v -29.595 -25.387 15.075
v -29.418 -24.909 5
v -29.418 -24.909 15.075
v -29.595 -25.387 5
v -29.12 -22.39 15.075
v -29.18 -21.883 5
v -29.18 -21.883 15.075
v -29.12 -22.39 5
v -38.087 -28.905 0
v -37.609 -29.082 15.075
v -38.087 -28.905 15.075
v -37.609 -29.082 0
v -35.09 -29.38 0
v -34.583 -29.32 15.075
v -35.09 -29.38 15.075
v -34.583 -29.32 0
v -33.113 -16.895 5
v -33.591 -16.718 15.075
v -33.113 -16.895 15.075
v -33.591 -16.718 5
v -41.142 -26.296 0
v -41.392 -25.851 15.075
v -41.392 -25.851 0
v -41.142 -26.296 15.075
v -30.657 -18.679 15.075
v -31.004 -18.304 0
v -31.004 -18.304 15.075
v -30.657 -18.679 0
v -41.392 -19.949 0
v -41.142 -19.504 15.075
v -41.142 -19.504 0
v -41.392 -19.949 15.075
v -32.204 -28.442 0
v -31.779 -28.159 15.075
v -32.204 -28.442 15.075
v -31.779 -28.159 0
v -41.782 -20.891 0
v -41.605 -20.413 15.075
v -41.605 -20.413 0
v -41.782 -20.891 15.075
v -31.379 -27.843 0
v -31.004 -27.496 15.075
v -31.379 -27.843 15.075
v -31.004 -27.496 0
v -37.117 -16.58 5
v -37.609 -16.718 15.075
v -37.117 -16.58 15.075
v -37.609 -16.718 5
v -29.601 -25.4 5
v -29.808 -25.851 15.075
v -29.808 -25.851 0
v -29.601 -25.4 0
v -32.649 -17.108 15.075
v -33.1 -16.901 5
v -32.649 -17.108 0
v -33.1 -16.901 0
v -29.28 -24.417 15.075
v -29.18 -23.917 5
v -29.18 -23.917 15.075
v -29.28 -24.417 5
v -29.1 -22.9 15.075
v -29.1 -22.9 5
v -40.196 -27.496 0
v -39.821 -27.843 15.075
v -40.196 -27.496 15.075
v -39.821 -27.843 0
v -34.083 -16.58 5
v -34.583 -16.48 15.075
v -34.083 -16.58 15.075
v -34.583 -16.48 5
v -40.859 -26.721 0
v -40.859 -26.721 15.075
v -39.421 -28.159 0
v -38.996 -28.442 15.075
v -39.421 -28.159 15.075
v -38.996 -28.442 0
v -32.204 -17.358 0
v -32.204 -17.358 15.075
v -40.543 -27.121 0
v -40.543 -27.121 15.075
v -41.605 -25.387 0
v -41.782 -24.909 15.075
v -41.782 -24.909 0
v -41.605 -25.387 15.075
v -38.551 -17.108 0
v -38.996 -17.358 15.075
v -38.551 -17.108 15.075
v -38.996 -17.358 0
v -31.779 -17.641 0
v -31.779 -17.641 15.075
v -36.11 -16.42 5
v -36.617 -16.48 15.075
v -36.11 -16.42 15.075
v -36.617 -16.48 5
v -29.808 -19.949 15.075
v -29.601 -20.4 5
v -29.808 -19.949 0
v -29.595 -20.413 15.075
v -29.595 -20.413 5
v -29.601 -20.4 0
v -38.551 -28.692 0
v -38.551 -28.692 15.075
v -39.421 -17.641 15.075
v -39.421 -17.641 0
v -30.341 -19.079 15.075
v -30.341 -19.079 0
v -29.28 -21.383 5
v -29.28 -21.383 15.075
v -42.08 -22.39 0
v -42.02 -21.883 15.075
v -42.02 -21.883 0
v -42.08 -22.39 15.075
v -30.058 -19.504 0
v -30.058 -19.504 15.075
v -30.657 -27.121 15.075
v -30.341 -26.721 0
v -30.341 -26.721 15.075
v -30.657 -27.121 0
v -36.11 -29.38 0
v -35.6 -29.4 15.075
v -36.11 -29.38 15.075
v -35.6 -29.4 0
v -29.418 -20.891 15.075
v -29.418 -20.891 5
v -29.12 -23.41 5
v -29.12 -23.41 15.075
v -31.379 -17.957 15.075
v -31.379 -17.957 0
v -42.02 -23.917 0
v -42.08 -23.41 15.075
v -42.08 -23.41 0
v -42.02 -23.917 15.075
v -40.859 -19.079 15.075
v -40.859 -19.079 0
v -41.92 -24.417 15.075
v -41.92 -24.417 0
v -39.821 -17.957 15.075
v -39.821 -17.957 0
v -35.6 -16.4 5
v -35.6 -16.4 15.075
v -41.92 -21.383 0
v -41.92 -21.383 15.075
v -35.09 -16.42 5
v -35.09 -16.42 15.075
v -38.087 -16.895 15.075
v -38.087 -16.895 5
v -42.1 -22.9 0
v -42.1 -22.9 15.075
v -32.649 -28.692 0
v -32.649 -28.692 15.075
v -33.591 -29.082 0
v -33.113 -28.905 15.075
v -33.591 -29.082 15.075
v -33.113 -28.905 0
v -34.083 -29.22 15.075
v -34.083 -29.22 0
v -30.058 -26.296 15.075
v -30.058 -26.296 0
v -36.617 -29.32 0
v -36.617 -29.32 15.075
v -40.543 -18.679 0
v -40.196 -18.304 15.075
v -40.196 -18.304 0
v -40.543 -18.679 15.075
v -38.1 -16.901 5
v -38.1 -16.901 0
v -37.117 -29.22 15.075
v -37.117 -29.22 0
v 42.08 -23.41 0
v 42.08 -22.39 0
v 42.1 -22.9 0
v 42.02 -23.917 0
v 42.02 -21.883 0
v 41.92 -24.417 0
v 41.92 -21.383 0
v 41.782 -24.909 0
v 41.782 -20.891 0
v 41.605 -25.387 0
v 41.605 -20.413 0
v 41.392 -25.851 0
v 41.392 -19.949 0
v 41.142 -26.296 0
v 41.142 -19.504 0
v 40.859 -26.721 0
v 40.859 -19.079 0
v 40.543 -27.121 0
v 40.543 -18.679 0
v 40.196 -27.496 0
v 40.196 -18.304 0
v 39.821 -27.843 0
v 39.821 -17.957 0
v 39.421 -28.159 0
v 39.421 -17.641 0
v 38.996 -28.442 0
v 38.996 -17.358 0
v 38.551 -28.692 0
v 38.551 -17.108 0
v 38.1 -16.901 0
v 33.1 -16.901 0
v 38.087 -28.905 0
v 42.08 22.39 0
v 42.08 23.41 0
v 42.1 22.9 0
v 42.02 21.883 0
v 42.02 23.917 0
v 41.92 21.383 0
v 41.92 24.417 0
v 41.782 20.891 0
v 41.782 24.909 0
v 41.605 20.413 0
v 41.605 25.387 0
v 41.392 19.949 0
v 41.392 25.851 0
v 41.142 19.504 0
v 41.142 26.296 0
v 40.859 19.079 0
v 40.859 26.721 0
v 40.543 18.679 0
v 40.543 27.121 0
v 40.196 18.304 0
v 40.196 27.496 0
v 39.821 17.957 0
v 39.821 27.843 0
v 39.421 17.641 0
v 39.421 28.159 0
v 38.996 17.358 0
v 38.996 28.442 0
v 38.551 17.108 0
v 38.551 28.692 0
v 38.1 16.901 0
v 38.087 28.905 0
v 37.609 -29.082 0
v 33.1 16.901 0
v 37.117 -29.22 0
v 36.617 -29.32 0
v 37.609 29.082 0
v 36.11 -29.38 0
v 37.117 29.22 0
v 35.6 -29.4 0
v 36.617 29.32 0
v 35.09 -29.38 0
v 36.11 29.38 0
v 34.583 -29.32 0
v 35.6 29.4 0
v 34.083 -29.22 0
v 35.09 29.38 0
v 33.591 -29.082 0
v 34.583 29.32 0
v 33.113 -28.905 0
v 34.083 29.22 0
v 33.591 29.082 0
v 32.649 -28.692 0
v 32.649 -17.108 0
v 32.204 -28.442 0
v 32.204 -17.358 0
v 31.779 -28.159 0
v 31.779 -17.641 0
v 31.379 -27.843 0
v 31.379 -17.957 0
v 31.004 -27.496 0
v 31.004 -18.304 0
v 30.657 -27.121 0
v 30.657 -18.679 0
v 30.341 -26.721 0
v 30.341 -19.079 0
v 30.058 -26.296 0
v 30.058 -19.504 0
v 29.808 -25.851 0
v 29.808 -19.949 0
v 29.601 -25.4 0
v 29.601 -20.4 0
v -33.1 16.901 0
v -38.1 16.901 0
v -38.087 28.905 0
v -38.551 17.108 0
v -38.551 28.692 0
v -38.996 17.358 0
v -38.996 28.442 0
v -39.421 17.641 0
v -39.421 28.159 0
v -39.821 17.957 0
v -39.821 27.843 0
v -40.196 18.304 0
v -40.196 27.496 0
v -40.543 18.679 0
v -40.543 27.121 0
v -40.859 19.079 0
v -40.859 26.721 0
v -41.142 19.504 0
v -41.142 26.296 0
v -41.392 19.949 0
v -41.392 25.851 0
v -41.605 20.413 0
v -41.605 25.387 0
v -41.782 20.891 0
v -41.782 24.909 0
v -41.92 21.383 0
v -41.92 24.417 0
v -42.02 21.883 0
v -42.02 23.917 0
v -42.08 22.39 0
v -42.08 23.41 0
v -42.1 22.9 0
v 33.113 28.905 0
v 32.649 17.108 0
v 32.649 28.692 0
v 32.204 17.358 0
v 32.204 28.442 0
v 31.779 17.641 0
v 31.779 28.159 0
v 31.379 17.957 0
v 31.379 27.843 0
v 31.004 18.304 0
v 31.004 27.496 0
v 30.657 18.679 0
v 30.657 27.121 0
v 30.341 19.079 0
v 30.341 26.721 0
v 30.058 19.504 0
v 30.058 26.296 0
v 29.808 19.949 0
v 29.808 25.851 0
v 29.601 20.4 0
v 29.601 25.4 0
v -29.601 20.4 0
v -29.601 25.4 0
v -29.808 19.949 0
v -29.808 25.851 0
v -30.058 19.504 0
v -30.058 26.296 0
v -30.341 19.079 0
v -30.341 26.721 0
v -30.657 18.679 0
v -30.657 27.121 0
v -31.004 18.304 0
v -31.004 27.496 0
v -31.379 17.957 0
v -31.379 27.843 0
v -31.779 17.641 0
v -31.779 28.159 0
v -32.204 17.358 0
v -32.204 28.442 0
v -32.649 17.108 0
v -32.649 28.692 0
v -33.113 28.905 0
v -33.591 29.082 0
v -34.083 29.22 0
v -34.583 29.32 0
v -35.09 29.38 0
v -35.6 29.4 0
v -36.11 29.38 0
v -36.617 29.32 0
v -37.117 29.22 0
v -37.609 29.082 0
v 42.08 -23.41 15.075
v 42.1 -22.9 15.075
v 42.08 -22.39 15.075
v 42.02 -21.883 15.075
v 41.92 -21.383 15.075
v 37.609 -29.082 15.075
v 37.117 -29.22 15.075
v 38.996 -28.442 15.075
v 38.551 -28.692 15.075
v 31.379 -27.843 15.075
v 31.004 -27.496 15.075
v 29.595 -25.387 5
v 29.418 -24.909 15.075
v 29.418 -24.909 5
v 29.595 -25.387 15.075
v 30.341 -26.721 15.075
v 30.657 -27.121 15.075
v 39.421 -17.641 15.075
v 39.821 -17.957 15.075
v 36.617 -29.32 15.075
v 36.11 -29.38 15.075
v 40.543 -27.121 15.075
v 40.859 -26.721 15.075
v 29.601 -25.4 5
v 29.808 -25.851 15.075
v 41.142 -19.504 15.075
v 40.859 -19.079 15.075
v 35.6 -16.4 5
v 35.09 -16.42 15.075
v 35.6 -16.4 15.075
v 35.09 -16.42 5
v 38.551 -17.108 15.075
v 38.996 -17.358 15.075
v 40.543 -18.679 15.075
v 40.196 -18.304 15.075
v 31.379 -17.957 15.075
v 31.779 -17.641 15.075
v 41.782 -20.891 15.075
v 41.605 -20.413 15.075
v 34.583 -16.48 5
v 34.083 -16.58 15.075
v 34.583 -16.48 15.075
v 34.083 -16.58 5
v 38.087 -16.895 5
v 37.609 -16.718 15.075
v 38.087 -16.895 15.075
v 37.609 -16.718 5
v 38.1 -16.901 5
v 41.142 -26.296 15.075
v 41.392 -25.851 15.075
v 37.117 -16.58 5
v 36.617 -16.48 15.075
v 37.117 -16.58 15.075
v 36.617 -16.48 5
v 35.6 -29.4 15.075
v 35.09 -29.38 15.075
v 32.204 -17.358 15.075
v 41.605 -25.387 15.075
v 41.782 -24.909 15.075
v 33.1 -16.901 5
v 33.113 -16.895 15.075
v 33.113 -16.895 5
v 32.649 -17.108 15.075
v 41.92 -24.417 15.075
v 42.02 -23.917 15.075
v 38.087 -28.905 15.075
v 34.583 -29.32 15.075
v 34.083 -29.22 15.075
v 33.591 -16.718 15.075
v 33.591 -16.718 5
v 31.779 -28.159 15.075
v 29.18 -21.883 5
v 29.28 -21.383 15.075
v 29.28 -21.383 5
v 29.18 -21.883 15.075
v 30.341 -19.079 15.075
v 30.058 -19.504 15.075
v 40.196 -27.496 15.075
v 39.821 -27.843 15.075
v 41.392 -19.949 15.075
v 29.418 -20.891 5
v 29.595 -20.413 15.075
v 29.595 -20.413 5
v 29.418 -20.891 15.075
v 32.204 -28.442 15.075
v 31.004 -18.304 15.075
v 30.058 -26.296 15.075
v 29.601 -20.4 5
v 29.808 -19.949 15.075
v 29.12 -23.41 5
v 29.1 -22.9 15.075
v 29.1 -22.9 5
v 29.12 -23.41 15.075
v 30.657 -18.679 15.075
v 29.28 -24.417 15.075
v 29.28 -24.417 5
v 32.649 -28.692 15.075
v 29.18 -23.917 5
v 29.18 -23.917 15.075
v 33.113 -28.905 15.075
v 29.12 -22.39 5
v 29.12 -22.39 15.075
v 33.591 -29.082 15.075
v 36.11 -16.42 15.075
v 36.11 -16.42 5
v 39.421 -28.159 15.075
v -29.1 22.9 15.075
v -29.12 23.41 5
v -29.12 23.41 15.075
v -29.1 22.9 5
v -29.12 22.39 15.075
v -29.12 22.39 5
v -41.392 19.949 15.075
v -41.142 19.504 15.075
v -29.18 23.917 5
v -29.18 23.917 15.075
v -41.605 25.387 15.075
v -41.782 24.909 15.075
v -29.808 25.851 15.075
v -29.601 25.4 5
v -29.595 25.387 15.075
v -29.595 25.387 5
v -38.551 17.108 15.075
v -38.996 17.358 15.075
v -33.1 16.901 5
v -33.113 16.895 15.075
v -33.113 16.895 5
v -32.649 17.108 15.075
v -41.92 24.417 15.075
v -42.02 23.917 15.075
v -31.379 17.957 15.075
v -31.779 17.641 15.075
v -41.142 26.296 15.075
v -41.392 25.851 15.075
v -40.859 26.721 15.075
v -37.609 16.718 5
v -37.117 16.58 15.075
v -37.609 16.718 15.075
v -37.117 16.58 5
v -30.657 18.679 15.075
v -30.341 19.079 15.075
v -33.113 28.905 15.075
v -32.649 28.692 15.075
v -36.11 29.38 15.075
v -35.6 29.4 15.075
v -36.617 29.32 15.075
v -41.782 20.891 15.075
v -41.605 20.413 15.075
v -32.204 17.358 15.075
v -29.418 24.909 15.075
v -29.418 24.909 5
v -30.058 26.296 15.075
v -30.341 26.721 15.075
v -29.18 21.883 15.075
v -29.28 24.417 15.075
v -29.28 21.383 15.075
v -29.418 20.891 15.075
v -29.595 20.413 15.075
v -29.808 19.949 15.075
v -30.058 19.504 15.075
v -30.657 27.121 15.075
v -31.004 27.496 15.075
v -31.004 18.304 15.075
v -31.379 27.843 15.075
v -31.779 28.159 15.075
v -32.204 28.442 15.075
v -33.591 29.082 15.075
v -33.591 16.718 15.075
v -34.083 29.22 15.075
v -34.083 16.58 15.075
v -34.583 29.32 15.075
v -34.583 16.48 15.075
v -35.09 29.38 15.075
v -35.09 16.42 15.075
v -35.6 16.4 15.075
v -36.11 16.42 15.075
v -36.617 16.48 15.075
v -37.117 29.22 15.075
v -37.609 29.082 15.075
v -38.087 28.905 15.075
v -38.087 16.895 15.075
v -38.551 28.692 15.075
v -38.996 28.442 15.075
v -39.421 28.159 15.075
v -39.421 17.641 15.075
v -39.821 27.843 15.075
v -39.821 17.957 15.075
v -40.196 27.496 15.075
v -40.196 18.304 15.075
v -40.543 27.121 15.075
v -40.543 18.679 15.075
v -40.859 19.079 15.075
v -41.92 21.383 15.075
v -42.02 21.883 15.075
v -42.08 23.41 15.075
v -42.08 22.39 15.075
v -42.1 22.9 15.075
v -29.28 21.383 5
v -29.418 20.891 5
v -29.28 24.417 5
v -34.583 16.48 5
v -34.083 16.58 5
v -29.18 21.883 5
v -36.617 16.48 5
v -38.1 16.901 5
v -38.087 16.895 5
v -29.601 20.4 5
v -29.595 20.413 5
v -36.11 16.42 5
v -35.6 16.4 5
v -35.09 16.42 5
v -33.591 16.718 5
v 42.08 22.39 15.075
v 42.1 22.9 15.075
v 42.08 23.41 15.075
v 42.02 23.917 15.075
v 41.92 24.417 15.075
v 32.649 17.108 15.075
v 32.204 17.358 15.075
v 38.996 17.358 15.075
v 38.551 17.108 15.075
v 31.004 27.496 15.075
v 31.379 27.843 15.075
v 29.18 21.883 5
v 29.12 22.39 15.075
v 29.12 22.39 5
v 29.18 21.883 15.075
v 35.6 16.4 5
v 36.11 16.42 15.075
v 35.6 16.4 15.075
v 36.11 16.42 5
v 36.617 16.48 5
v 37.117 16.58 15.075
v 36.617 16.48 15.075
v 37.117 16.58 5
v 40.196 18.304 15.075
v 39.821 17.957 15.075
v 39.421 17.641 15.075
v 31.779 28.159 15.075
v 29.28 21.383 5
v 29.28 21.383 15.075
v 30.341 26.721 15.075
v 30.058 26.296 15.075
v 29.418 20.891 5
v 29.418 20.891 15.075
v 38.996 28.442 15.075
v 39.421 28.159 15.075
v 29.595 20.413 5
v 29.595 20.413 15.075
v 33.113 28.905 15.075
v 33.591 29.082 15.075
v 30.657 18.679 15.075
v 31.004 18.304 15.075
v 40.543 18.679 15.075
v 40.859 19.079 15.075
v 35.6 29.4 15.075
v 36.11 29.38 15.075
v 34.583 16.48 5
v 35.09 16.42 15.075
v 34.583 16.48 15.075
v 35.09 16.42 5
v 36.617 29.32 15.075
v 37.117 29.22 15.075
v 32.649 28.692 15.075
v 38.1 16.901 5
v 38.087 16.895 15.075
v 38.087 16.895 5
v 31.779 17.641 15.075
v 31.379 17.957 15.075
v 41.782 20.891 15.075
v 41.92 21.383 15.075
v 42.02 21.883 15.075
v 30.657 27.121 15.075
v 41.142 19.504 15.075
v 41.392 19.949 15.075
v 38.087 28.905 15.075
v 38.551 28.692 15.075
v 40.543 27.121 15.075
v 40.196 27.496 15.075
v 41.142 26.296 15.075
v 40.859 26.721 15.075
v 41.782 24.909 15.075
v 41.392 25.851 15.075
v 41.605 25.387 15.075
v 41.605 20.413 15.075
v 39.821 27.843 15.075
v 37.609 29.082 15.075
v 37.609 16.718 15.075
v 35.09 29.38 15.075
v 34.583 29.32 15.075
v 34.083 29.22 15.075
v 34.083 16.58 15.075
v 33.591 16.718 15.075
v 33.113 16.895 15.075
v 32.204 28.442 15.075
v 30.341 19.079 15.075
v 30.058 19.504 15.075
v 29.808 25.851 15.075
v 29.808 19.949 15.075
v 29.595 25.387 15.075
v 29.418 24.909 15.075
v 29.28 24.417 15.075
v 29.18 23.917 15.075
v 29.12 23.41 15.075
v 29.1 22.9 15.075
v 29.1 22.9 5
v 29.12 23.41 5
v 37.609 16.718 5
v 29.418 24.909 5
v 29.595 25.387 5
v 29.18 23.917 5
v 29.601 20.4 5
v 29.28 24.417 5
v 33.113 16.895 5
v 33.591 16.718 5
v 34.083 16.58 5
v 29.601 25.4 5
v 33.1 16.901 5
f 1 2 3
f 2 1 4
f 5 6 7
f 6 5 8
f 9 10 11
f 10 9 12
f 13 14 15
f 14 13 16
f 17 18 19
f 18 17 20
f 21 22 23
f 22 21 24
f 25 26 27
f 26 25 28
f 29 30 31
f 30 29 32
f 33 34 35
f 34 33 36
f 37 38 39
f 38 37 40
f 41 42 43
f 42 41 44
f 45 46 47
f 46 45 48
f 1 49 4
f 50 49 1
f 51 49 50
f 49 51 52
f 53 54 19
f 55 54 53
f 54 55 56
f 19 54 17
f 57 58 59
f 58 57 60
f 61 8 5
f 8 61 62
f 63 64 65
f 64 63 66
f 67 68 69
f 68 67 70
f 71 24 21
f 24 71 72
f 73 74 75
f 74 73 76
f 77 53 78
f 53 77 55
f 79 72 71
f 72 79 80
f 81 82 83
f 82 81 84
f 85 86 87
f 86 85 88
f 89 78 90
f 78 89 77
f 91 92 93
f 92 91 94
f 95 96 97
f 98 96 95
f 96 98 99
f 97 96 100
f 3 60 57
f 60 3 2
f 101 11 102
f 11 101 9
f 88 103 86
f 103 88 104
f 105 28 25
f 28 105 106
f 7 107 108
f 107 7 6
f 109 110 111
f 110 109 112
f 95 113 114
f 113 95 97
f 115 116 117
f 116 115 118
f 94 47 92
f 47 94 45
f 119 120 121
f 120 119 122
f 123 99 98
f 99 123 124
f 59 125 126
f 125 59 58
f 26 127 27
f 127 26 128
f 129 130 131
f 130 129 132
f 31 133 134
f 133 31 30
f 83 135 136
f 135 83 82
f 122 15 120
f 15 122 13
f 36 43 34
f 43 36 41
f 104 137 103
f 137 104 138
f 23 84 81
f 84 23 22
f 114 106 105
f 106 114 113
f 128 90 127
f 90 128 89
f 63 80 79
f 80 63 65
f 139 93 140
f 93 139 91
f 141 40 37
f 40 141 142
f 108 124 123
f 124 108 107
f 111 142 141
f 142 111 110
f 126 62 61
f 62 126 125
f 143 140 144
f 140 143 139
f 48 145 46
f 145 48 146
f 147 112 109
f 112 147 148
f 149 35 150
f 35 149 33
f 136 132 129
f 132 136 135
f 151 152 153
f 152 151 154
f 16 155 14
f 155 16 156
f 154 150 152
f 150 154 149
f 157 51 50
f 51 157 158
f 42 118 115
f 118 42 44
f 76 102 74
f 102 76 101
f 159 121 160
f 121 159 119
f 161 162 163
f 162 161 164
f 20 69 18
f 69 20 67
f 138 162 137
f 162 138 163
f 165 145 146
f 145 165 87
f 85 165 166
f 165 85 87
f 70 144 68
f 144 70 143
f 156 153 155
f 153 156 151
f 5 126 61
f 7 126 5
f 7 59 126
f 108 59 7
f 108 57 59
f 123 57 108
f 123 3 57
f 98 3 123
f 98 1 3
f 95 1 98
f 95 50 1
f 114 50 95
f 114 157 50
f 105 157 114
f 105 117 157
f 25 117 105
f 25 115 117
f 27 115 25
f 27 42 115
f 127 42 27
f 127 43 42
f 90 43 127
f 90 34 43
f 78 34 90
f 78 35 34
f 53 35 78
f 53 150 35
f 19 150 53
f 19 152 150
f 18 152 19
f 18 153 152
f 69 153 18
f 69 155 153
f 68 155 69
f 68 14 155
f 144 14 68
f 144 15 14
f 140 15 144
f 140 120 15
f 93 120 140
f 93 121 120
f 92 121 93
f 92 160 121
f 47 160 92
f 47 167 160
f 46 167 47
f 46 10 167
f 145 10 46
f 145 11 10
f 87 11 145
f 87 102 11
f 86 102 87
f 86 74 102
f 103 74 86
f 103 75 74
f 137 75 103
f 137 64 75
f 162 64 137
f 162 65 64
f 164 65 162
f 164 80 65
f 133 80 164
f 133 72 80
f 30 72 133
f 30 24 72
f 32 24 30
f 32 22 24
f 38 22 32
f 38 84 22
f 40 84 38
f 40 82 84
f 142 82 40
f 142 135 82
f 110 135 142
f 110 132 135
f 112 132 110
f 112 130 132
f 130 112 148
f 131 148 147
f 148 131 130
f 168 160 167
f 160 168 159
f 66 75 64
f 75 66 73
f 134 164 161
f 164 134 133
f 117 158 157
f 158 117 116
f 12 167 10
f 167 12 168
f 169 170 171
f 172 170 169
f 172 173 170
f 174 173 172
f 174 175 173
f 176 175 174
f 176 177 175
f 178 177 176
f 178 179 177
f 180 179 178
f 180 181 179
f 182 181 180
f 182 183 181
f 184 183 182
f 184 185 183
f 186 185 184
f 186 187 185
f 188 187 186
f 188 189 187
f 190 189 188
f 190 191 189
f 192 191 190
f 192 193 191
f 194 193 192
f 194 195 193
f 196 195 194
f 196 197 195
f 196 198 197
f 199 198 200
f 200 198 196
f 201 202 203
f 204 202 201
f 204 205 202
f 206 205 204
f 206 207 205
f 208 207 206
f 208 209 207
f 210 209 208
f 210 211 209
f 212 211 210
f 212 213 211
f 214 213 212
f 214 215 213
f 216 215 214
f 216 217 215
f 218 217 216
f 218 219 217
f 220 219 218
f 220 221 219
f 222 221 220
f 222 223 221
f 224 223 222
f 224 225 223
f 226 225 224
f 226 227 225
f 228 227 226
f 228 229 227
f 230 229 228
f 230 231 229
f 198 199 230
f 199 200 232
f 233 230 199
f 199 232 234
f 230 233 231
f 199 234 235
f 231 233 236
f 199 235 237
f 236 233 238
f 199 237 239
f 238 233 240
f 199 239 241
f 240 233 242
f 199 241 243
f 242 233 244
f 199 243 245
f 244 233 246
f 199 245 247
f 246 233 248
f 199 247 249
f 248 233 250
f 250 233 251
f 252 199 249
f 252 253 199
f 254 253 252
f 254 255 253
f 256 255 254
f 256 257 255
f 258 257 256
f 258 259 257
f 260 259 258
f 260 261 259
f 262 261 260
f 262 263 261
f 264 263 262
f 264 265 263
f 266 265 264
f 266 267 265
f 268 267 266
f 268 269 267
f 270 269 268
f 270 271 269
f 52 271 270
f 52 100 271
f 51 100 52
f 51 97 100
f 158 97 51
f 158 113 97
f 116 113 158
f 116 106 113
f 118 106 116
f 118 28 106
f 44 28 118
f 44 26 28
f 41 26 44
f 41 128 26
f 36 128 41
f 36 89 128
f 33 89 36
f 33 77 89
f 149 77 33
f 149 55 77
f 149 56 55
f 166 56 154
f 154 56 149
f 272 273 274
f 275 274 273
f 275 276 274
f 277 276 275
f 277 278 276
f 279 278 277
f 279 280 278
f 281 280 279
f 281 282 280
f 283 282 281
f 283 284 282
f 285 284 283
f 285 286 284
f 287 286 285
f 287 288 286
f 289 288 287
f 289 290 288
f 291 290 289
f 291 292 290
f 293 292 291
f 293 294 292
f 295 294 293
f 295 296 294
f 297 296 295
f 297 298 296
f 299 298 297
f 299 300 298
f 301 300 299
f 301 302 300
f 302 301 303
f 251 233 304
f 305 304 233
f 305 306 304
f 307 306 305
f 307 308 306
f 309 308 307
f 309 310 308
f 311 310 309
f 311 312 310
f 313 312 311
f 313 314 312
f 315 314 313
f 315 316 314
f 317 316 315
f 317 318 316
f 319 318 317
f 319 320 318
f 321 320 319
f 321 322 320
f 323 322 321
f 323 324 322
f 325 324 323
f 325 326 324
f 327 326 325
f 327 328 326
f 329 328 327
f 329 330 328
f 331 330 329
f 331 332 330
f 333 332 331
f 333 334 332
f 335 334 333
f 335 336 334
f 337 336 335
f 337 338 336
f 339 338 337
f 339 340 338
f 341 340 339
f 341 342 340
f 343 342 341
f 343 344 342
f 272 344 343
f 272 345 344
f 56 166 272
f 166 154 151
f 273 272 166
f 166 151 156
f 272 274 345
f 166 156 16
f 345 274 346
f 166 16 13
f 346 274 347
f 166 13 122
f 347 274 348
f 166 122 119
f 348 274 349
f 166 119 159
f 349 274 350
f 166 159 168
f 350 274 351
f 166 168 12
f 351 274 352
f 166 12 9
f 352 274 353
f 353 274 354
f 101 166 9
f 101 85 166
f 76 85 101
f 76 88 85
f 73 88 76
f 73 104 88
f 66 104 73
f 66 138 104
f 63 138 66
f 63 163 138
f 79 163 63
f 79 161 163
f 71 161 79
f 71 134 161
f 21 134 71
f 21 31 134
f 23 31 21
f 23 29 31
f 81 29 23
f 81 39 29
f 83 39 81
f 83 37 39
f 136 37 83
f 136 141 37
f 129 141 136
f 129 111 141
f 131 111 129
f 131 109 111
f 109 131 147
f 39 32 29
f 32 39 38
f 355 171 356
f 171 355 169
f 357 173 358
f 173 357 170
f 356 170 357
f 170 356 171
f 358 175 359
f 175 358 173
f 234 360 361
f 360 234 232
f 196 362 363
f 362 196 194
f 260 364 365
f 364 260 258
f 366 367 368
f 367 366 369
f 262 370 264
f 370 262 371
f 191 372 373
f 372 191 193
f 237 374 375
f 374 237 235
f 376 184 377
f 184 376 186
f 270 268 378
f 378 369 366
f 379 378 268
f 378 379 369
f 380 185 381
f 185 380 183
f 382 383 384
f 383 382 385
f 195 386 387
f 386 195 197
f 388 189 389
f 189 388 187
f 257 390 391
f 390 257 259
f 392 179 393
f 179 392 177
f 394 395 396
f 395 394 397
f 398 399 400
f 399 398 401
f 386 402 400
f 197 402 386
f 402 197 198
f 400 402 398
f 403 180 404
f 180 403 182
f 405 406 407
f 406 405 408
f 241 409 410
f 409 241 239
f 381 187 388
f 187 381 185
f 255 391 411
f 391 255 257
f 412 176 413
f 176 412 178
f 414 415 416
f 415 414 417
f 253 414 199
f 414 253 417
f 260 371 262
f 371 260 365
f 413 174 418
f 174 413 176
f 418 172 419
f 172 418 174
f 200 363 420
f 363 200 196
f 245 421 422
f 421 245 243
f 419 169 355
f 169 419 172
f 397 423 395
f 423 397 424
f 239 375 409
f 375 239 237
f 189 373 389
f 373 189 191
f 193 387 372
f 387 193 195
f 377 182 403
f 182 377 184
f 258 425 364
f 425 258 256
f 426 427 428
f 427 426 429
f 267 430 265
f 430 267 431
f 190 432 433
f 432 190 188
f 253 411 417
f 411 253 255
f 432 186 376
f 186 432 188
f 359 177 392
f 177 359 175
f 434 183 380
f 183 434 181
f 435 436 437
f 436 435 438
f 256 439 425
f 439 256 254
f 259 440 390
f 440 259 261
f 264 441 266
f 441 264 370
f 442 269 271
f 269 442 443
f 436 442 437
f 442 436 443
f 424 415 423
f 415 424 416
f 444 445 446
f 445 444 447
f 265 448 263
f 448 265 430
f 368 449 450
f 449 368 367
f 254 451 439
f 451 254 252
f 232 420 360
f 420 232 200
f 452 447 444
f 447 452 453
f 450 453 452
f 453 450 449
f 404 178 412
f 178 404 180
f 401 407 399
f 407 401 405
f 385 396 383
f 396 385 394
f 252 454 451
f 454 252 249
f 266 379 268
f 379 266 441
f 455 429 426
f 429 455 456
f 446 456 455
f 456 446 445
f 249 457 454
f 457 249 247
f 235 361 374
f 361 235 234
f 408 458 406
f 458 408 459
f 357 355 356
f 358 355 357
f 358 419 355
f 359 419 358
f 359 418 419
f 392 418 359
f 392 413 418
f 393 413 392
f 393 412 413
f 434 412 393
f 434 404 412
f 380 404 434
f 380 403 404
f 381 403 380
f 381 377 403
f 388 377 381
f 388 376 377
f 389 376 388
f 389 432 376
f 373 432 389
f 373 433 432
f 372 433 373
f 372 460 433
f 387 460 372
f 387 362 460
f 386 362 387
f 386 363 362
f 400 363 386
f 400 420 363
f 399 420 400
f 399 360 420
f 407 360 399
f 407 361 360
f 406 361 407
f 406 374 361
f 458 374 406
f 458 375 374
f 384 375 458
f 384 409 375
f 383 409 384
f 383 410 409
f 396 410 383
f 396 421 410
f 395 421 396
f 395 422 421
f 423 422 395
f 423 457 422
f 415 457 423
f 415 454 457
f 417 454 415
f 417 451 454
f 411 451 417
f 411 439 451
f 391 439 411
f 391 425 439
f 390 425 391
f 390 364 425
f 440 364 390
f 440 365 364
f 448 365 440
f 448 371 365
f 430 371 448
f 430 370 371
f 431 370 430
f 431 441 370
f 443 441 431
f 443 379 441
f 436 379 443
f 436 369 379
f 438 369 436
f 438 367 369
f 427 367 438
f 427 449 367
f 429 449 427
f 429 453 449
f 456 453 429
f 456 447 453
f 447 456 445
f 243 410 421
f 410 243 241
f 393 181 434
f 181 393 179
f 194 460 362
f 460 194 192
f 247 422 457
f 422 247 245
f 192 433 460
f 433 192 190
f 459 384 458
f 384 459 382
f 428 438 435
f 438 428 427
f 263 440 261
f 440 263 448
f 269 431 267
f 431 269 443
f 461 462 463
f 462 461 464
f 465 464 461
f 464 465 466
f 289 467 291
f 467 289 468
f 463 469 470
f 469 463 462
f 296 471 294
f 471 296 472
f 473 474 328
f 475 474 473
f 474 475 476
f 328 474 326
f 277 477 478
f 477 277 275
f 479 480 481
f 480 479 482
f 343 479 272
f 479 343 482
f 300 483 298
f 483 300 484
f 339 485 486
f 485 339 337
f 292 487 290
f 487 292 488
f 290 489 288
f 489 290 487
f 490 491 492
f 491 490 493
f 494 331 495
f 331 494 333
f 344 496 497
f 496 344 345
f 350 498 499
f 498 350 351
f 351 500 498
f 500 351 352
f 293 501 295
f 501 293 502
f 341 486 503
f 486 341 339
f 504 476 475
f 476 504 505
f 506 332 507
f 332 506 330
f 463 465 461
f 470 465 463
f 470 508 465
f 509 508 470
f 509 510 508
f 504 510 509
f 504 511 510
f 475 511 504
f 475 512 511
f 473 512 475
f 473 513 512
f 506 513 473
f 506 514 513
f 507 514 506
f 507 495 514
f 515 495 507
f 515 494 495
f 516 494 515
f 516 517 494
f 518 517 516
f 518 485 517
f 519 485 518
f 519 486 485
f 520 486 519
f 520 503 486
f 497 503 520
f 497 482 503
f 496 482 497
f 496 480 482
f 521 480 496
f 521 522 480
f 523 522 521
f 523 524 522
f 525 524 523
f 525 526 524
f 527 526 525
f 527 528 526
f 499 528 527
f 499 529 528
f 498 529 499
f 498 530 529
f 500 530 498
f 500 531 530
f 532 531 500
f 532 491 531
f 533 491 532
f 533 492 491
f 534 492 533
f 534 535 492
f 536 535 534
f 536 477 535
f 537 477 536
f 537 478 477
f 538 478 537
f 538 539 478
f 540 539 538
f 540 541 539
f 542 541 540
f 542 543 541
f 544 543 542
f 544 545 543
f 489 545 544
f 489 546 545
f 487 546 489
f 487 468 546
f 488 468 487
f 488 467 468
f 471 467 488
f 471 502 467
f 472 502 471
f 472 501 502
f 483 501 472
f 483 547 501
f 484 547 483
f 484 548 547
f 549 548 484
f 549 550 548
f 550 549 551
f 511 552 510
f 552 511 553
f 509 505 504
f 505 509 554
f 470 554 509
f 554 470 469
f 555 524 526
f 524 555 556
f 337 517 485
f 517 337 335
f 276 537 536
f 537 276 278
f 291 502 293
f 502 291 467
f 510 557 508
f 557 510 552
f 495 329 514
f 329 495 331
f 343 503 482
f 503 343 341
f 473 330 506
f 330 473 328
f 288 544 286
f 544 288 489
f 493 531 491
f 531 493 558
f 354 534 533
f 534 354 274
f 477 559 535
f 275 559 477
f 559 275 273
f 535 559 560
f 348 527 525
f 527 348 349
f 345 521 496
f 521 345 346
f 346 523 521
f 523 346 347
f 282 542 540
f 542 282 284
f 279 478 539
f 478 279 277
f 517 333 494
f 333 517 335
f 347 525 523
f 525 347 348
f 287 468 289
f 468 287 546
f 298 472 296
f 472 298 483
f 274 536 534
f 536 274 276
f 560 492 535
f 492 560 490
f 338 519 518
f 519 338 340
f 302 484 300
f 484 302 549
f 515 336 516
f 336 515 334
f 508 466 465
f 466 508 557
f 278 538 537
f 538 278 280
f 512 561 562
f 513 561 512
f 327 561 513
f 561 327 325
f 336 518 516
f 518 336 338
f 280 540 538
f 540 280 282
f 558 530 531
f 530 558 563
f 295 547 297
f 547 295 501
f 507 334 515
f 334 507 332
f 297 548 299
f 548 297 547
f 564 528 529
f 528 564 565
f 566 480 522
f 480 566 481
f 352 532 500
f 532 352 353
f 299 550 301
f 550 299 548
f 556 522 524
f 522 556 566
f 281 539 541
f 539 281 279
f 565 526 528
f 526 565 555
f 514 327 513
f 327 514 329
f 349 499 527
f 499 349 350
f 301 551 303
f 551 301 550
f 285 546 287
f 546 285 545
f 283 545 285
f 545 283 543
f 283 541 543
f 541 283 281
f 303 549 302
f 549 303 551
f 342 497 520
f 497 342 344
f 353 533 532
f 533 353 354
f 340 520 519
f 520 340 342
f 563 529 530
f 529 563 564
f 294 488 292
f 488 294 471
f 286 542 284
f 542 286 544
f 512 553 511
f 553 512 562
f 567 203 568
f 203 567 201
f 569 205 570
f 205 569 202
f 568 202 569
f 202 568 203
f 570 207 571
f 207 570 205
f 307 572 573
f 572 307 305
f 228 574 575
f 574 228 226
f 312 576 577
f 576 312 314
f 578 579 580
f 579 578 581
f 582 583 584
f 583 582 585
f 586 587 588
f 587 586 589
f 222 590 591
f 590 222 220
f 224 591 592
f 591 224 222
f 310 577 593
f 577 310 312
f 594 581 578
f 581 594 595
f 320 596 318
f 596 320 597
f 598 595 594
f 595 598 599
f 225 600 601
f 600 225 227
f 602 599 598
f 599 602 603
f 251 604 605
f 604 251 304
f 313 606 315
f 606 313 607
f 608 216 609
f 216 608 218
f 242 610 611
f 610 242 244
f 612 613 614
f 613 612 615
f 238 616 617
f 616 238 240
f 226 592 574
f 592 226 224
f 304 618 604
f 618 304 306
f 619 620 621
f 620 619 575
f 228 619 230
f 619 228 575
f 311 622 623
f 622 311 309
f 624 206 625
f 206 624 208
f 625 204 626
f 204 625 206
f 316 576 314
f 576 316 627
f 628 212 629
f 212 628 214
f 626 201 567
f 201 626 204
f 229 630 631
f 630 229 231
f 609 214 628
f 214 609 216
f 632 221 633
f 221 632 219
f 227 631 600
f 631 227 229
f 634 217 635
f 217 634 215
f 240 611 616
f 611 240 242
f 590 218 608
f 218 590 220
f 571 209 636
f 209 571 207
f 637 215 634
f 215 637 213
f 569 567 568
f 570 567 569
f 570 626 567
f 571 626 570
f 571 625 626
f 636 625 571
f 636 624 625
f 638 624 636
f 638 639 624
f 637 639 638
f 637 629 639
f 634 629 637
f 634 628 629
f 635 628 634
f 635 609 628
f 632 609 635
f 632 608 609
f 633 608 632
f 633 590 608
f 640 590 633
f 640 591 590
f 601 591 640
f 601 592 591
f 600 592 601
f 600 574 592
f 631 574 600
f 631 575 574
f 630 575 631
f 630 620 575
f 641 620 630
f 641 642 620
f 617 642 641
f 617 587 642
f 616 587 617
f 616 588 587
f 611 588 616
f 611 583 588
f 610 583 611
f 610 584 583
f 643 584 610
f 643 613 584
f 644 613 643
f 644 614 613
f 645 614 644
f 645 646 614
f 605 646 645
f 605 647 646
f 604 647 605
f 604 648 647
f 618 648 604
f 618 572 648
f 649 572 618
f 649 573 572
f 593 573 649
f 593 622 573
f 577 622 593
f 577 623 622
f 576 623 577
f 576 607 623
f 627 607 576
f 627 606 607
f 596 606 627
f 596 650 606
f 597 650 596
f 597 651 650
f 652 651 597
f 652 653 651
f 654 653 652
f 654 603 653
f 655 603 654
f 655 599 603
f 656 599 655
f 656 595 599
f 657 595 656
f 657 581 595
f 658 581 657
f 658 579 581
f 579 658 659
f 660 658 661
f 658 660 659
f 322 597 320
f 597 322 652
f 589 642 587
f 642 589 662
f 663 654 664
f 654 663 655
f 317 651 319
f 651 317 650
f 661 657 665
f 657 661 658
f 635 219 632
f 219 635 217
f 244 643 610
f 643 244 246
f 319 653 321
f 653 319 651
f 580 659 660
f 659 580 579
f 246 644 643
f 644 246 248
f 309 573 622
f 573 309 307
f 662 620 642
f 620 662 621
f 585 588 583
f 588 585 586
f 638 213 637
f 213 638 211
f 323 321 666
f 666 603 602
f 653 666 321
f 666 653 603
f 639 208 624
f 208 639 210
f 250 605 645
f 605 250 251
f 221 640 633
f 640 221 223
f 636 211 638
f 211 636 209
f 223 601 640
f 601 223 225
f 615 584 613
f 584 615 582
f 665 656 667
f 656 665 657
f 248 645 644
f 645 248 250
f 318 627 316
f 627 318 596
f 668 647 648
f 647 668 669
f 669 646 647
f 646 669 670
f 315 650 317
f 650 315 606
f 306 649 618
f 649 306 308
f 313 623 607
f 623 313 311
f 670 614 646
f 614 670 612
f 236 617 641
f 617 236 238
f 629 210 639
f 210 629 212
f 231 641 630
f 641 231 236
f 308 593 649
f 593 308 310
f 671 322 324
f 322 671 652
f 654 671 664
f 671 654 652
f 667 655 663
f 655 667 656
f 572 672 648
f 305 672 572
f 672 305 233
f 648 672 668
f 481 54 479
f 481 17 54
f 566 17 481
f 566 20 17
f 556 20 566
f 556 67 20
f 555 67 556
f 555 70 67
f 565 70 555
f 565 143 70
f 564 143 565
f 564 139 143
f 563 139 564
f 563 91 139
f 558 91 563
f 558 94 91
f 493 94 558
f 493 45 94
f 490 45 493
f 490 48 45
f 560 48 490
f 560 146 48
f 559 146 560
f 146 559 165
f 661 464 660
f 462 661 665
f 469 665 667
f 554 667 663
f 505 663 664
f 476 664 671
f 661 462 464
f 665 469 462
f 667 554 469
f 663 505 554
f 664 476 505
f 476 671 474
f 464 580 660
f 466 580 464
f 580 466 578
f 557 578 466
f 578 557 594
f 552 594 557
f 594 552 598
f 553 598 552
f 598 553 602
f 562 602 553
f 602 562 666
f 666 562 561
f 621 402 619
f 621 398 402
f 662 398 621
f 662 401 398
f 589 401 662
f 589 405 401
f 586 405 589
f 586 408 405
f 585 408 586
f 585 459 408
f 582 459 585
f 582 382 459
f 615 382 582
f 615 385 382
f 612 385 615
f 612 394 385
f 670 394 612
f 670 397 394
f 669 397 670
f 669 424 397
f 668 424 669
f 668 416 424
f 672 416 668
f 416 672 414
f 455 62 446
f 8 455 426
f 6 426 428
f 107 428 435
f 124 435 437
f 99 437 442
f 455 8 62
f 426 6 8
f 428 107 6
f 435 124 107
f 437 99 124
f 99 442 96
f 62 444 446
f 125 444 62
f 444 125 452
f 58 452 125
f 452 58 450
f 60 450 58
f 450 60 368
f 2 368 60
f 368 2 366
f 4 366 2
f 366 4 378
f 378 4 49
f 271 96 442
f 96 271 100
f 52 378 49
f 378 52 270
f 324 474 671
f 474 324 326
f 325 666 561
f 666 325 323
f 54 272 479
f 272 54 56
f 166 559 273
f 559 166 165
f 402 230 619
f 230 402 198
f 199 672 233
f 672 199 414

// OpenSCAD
H = 1.25 * 25.4 * 0.5 - 0.8;    // height for pcb

DX = 3 * 25.4 - 5;
DY = 2 * 25.4 - 5;
D = 13.0;
PILLAR = 5;

$fn = 80;

translate([-DX/2, -DY/2, 0]) cylinder(h=H, d=D);
translate([ DX/2, -DY/2, 0]) cylinder(h=H, d=D);
translate([-DX/2,  DY/2, 0]) cylinder(h=H, d=D);
translate([ DX/2,  DY/2, 0]) cylinder(h=H, d=D);

translate([-DX/2, -DY/2 - PILLAR/2, 0]) cube(size=[DX, PILLAR, PILLAR]);
translate([-DX/2,  DY/2 - PILLAR/2, 0]) cube(size=[DX, PILLAR, PILLAR]);
translate([-DX/2 - PILLAR/2, -DY/2, 0]) cube(size=[PILLAR, DY, PILLAR]);
translate([ DX/2 - PILLAR/2, -DY/2, 0]) cube(size=[PILLAR, DY, PILLAR]);
